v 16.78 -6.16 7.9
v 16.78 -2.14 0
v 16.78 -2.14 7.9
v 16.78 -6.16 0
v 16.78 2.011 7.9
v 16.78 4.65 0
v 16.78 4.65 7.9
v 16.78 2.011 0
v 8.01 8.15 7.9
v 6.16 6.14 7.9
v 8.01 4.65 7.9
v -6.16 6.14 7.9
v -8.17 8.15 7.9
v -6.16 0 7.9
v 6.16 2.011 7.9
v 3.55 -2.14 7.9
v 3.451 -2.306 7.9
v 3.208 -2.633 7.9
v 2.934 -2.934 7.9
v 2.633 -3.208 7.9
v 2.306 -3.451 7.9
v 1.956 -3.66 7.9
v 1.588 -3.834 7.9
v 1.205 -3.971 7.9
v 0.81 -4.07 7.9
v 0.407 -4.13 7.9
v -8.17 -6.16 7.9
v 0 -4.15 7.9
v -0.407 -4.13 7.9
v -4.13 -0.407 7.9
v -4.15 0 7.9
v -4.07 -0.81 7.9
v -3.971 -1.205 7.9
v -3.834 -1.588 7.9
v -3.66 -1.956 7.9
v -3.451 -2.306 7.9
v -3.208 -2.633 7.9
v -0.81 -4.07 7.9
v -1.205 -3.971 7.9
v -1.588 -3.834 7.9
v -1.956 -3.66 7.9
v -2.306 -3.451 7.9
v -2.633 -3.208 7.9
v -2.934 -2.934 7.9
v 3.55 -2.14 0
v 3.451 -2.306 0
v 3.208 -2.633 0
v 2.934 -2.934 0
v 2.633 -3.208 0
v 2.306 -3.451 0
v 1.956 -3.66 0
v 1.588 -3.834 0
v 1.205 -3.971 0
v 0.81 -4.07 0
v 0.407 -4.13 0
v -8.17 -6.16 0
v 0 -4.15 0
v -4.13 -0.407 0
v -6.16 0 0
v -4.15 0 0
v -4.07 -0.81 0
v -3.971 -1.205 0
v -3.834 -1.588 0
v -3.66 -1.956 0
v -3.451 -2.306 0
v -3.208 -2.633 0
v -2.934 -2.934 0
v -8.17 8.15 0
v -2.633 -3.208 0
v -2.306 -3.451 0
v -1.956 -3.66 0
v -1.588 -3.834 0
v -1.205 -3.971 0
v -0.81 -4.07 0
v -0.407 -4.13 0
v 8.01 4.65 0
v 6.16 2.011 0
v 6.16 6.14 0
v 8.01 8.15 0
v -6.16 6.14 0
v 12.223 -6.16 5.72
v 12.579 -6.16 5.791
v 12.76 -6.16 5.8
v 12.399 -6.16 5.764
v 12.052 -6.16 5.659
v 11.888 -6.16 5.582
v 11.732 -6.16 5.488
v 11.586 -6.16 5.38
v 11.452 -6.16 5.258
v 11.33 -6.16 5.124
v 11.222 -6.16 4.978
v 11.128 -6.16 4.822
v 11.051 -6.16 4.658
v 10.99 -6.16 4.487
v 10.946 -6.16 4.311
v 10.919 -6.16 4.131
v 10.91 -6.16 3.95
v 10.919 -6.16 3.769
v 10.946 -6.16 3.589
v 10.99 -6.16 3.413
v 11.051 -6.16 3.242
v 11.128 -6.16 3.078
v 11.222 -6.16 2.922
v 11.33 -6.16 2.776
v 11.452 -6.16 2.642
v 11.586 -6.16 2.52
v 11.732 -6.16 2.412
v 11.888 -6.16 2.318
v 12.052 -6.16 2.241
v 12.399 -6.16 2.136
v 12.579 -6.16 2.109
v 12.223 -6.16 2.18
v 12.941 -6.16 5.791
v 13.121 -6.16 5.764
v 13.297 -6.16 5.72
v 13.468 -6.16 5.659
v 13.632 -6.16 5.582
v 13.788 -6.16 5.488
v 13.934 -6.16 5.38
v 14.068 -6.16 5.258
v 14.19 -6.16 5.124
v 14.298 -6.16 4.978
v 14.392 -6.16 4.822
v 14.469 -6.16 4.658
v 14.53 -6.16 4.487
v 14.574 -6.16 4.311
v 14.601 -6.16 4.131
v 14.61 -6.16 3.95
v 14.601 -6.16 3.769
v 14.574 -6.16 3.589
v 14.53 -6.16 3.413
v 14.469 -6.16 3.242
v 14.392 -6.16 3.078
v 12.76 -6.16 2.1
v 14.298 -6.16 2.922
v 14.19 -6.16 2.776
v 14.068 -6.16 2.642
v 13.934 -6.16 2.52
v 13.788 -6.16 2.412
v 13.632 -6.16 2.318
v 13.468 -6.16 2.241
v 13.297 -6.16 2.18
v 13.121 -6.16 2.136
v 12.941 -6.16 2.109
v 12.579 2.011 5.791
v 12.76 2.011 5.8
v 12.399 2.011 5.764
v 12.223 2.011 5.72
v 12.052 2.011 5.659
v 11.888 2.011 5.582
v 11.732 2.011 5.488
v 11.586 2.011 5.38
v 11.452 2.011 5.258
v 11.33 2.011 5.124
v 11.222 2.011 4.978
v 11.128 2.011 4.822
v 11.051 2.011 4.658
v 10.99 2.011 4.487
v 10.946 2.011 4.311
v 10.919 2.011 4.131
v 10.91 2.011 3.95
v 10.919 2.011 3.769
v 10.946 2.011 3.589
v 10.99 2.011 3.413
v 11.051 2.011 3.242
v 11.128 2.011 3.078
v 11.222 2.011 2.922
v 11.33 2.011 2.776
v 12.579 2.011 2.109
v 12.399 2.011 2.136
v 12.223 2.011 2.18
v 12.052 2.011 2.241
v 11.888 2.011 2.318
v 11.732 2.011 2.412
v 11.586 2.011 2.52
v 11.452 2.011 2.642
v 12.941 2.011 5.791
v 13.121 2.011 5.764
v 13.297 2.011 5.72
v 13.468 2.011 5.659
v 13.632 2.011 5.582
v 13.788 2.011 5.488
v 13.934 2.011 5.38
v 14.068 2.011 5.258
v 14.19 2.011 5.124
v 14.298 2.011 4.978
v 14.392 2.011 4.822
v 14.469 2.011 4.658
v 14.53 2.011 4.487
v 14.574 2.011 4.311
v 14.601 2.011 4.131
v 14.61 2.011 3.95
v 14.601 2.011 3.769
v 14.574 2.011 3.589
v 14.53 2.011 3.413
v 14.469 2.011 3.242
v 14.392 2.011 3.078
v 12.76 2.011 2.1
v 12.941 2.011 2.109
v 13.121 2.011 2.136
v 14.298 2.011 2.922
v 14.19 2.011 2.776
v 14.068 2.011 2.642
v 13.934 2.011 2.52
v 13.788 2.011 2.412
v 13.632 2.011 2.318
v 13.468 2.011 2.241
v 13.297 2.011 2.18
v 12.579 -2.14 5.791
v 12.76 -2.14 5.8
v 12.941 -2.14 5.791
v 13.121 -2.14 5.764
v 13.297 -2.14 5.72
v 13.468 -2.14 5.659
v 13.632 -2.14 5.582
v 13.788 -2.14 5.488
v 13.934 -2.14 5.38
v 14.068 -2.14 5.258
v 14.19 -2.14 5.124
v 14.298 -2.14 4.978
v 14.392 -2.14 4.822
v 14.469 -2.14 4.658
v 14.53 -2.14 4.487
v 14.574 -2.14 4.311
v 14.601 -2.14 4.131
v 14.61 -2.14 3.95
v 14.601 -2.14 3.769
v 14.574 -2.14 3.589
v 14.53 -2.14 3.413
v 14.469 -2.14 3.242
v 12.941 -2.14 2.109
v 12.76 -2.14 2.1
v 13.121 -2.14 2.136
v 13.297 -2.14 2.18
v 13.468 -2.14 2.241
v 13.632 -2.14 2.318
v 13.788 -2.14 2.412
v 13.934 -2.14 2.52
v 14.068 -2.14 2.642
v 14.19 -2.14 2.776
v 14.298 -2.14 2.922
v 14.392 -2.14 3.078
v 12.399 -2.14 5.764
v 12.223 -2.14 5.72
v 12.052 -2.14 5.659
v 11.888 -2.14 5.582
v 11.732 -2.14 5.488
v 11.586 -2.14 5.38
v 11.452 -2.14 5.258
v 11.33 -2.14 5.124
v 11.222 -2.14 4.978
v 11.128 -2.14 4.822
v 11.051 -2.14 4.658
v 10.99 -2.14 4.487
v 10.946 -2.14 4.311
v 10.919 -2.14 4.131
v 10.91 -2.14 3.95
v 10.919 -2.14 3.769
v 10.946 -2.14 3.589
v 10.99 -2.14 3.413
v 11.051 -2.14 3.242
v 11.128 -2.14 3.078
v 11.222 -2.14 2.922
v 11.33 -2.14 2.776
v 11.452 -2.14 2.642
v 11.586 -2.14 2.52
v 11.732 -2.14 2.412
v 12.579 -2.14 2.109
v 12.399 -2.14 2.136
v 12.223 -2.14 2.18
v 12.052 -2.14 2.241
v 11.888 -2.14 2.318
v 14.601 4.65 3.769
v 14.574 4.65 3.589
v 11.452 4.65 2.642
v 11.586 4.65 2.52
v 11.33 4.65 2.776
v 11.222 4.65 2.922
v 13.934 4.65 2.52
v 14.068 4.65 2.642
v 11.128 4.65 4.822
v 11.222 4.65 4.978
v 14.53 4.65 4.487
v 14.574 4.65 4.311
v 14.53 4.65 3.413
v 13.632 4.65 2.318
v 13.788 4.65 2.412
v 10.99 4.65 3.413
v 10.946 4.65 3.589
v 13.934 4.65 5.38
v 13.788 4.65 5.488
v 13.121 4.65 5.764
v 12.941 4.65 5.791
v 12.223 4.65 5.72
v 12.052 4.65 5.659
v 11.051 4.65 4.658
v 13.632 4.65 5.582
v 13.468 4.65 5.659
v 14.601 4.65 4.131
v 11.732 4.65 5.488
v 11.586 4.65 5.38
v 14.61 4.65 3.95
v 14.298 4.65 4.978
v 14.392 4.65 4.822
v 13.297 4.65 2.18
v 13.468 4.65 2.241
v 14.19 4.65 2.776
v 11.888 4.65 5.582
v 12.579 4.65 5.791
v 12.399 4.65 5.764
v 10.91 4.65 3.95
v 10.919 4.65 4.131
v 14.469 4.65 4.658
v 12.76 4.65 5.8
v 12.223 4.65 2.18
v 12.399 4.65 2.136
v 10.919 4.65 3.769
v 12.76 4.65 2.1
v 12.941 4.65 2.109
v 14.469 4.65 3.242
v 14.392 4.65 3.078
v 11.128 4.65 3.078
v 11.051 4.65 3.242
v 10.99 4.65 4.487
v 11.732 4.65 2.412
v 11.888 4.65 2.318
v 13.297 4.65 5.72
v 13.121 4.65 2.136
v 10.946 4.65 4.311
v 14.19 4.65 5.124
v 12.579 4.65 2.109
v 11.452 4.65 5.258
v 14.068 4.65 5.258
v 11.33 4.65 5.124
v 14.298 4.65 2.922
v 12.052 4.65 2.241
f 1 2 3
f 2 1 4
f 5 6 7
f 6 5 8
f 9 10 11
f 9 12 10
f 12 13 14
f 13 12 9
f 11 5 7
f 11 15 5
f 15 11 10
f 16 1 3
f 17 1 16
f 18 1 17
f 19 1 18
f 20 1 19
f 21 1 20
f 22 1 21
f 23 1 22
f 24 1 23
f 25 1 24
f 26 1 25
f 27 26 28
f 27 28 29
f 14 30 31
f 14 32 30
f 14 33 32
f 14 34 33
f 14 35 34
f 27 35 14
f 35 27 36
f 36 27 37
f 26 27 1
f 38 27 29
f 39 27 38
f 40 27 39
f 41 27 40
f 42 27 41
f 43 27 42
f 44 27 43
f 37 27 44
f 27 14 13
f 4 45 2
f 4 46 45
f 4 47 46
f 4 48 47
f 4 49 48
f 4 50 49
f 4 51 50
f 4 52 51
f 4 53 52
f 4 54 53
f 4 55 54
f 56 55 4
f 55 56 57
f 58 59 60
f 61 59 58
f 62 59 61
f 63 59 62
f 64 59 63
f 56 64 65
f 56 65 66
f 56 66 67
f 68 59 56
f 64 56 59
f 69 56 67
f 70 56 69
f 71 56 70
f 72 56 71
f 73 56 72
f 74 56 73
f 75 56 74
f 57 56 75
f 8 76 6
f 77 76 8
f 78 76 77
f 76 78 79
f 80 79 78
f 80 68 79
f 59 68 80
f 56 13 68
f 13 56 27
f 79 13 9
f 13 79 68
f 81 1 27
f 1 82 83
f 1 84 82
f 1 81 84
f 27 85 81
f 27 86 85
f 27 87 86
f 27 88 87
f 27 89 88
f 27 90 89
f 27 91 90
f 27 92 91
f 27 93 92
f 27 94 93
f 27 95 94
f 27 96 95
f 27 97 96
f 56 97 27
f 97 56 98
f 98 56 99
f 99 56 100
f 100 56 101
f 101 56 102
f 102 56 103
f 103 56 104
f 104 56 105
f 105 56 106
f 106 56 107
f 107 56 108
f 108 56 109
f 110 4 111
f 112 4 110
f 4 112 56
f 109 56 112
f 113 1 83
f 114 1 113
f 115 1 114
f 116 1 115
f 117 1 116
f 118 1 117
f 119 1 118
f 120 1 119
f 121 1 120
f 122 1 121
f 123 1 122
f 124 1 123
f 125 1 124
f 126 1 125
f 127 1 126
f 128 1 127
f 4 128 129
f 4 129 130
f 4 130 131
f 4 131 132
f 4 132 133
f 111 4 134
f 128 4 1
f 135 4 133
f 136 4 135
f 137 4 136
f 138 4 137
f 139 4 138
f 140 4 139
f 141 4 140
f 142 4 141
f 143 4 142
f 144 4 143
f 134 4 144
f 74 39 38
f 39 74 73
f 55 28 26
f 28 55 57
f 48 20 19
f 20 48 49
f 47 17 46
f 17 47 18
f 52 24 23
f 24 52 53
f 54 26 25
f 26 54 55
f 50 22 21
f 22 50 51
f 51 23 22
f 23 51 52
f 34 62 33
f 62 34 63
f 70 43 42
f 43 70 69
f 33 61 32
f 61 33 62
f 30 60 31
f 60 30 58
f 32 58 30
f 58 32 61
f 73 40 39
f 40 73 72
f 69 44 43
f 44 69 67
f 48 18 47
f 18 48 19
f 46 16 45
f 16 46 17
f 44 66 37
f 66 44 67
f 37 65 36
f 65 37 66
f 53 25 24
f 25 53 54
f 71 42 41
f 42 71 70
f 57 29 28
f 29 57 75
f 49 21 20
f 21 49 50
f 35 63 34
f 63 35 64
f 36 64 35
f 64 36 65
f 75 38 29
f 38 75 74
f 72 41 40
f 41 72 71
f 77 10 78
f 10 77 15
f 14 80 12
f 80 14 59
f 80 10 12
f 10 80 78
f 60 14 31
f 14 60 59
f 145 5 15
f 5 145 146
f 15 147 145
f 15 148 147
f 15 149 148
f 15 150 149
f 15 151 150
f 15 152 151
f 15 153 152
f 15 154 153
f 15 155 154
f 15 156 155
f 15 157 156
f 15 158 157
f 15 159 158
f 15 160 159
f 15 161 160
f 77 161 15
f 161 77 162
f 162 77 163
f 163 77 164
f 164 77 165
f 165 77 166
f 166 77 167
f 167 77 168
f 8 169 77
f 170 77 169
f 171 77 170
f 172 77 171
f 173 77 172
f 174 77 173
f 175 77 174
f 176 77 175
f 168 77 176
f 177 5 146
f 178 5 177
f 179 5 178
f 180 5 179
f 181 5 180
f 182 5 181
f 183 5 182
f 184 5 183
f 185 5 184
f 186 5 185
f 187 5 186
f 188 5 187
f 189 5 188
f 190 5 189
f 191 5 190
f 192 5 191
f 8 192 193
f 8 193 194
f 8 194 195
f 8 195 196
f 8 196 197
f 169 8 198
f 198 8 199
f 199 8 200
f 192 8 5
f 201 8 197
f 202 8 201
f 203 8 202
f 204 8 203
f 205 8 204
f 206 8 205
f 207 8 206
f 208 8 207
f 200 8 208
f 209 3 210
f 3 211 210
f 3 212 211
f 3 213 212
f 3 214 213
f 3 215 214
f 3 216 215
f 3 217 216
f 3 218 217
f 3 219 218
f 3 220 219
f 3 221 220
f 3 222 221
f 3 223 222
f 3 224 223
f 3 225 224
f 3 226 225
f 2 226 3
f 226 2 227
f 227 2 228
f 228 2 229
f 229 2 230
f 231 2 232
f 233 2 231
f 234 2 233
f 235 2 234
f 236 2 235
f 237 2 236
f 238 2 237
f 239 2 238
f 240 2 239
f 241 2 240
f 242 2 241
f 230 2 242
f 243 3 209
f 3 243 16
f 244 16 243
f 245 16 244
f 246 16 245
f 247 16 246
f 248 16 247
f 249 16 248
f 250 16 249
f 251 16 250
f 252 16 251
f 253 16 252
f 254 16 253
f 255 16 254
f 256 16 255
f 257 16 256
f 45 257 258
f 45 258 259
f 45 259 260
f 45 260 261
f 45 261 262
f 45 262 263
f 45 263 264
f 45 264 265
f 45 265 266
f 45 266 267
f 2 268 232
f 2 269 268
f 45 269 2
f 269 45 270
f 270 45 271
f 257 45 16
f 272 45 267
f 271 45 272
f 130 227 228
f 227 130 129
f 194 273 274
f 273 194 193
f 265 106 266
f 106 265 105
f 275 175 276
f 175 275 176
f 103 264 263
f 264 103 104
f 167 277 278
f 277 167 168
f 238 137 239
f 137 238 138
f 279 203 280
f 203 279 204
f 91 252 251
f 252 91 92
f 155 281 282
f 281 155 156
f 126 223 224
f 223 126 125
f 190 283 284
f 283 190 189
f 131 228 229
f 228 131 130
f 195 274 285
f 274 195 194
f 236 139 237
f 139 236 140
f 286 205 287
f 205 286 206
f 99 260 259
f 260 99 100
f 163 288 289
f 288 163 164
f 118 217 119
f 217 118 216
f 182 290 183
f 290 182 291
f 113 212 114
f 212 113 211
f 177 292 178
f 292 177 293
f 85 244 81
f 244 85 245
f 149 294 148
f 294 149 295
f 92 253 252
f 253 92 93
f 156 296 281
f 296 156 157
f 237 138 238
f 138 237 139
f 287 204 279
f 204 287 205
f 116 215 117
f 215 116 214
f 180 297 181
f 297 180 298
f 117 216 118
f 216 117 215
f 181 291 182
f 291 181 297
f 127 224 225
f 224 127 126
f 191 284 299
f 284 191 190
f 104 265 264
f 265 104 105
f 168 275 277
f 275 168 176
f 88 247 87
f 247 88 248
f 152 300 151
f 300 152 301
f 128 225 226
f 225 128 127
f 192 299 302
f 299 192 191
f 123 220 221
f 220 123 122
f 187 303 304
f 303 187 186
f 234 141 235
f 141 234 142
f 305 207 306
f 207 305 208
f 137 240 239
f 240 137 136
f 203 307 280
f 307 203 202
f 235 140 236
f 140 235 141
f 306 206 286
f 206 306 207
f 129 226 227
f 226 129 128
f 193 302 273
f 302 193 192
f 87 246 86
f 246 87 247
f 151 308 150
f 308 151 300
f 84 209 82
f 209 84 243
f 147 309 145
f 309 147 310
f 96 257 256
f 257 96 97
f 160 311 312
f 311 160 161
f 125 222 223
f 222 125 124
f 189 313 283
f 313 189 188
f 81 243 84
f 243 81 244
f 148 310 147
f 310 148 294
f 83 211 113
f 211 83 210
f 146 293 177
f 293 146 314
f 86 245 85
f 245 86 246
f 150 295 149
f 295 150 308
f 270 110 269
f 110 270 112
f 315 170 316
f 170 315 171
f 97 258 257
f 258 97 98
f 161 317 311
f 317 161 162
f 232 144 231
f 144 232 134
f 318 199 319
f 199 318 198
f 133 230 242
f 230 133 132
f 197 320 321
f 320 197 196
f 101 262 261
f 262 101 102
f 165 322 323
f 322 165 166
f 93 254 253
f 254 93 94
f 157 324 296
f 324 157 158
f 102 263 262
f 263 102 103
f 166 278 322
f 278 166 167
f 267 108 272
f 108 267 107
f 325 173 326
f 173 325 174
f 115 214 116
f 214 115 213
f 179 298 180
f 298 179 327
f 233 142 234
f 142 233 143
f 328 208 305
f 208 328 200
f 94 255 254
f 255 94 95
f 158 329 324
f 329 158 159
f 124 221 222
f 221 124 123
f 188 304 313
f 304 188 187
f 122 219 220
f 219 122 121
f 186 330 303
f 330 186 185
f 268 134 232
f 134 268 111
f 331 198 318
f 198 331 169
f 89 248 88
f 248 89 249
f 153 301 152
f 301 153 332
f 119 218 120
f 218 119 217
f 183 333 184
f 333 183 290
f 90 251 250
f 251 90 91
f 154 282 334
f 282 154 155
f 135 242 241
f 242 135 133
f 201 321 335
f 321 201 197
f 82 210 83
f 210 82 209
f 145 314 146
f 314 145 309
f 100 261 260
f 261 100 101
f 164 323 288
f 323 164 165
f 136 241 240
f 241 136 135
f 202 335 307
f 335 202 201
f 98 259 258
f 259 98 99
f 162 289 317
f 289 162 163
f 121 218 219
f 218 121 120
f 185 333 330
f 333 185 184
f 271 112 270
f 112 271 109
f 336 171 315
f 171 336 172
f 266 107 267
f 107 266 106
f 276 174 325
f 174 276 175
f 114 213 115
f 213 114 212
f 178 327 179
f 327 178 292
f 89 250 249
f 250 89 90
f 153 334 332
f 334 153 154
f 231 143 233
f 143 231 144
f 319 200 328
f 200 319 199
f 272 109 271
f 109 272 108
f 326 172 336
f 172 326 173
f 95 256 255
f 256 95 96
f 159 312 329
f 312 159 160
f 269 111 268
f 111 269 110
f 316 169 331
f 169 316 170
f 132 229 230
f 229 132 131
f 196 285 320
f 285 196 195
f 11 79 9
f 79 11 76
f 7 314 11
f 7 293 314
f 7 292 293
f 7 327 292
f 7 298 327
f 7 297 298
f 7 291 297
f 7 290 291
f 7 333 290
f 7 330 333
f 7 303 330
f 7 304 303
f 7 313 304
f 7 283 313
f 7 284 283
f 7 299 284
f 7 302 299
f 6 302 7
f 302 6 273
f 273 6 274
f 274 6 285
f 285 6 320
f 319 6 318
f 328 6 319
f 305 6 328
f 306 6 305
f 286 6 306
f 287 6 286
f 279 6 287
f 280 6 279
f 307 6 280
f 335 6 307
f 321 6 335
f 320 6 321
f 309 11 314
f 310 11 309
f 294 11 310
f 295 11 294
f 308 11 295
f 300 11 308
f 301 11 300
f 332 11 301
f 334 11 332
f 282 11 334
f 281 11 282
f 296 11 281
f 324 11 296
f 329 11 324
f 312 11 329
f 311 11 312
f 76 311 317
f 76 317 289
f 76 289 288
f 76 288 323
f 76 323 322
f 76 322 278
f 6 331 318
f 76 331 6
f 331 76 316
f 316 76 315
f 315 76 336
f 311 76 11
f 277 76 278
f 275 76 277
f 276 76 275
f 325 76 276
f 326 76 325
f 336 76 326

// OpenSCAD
// file: linear_bushing_housing.scad
/*
 * Igor Soares' parallel kinematic XY
 * Linear bushing housing
 * (C) 2014 by Ígor Bruno Pereira Soares
 *
 * This project is free: you can redistribute it and/or modify
 * it under the terms of the GNU General Public License as published by
 * the Free Software Foundation, either version 2 of the License, or
 * (at your option) any later version.
 *
 * This project is distributed in the hope that it will be useful,
 * but WITHOUT ANY WARRANTY; without even the implied warranty of
 * MERCHANTABILITY or FITNESS FOR A PARTICULAR PURPOSE.  See the
 * GNU General Public License for more details.
 *
 * You should have received a copy of the GNU General Public License
 * along with this project.  If not, see <http://www.gnu.org/licenses/>.
 */

include <configuration.scad>

linear_bushing_housing($fn=64);

module linear_bushing_housing_positive(
    wall=WALL_WIDTH,
    lwall=LIGHT_WALL_WIDTH,
    hsupp=HORIZONTAL_SUPPORT_WALL,
    vsupp=VERTICAL_SUPPORT_WALL,
    screw_r=3.7/2,
    screw_nut_width=6.7,
    bushing_r=LINEAR_BUSHING_DIAMETER/2,
    bushing_l=LINEAR_BUSHING_LEN,
    bushing_wall=LINEAR_BUSHING_WALL,
    num_screws=1)
{
  union() {
    //bushing
    cylinder(r=bushing_r + lwall, h=bushing_l + 2*bushing_wall);
    translate([0, -bushing_r - lwall, 0])
      cube([(bushing_r + screw_r),
            2*(bushing_r + lwall),
            bushing_l + 2*bushing_wall]);
    //bushing screws
    if(num_screws >= 1)
      translate([(bushing_r + screw_r),
                 0,
                 (lwall+screw_r)/cos(45)])
        rotate([0,45,0])
          cube([2*(screw_r + lwall), 2*(bushing_r + lwall), 2*(screw_r + lwall)],
               center=true);
    if(num_screws >= 2)
      translate([(bushing_r + screw_r),
                 0,
                 bushing_l + 2*bushing_wall - (lwall+screw_r)/cos(45)])
        rotate([0,45,0])
          cube([2*(screw_r + lwall), 2*(bushing_r + lwall), 2*(screw_r + lwall)],
               center=true);
  }
}

module linear_bushing_housing_negative(
    wall=WALL_WIDTH,
    lwall=LIGHT_WALL_WIDTH,
    hsupp=HORIZONTAL_SUPPORT_WALL,
    vsupp=VERTICAL_SUPPORT_WALL,
    screw_r=3.7/2,
    screw_nut_width=6.7,
    bushing_r=LINEAR_BUSHING_DIAMETER/2,
    bushing_l=LINEAR_BUSHING_LEN,
    bushing_wall=LINEAR_BUSHING_WALL,
    num_screws=1)
{
  union() {
    //bushing
    translate([0,0,-ST])
      cylinder(r=bushing_r - bushing_wall, h=bushing_l + bushing_wall);
    translate([0,0,bushing_l + bushing_wall + hsupp])
      cylinder(r=bushing_r - bushing_wall, h=bushing_wall + ST);
    translate([0,0,bushing_wall])
      cylinder(r=bushing_r, h=bushing_l);

    //bushing access
    translate([0, -bushing_r + bushing_wall, 0])
      union()
    {
      translate([0,0,-ST])
        cube([(bushing_r + lwall) + (2*screw_r + wall)/cos(45) +1,
               2*(bushing_r -bushing_wall),
               bushing_l + bushing_wall]);
      translate([0, 0, bushing_l + bushing_wall + hsupp])
        cube([(bushing_r + lwall) + (2*screw_r + wall)/cos(45) +1,
               2*(bushing_r -bushing_wall),
               bushing_wall +ST]);
    }
    //bushing screws
    if(num_screws >= 1)
      translate([(bushing_r + screw_r),
                 0,
                 (lwall+screw_r)/cos(45)])
        rotate([90,0,0])
          cylinder(r=screw_r, h=2*bushing_r + 2*lwall +2, center=true);

    if(num_screws >= 2)
      translate([(bushing_r + screw_r),
                 0,
                 bushing_l + 2*bushing_wall - (lwall+screw_r)/cos(45)])
        rotate([90,0,0])
          cylinder(r=screw_r, h=2*bushing_r + 2*lwall +2, center=true);
  }
}

module linear_bushing_housing(
    wall=WALL_WIDTH,
    lwall=LIGHT_WALL_WIDTH,
    hsupp=HORIZONTAL_SUPPORT_WALL,
    vsupp=VERTICAL_SUPPORT_WALL,
    screw_r=3.7/2,
    screw_nut_width=6.7,
    bushing_r=LINEAR_BUSHING_DIAMETER/2,
    bushing_l=LINEAR_BUSHING_LEN,
    bushing_wall=LINEAR_BUSHING_WALL,
    num_screws=1)
{
  difference() {
    linear_bushing_housing_positive(
      wall=wall,
      lwall=lwall,
      hsupp=hsupp,
      vsupp=vsupp,
      screw_r=screw_r,
      screw_nut_width=screw_nut_width,
      bushing_r=bushing_r,
      bushing_l=bushing_l,
      bushing_wall=bushing_wall,
      num_screws=num_screws);
    linear_bushing_housing_negative(
      wall=wall,
      lwall=lwall,
      hsupp=hsupp,
      vsupp=vsupp,
      screw_r=screw_r,
      screw_nut_width=screw_nut_width,
      bushing_r=bushing_r,
      bushing_l=bushing_l,
      bushing_wall=bushing_wall,
      num_screws=num_screws);
  }
}
// file: configuration.scad
/*
 * Igor Soares' parallel kinematic XY
 * Configuration
 * (C) 2014 by Ígor Bruno Pereira Soares
 *
 * This project is free: you can redistribute it and/or modify
 * it under the terms of the GNU General Public License as published by
 * the Free Software Foundation, either version 2 of the License, or
 * (at your option) any later version.
 *
 * This project is distributed in the hope that it will be useful,
 * but WITHOUT ANY WARRANTY; without even the implied warranty of
 * MERCHANTABILITY or FITNESS FOR A PARTICULAR PURPOSE.  See the
 * GNU General Public License for more details.
 *
 * You should have received a copy of the GNU General Public License
 * along with this project.  If not, see <http://www.gnu.org/licenses/>.
 */

LIGHT_WALL_WIDTH = 2.01;
WALL_WIDTH = 5.0;
VERTICAL_SUPPORT_WALL = 0.5;
HORIZONTAL_SUPPORT_WALL = 0.255;

BEARING_DIAMETER = 22.4;
BEARING_WIDTH = 7;
BEARING_SCREW_DIAMETER = 8.2;
BEARING_SCREW_NUT_WIDTH = 13;

LINEAR_BUSHING_DIAMETER = 15.3;
LINEAR_BUSHING_LEN = 24.4;
LINEAR_BUSHING_WALL = 1.0;

INNER_BEARING_SCREW_DISTANCE_TO_ROD = VERTICAL_SUPPORT_WALL;
INNER_BEARING_POS = 15;

SPACING_TO_BEARING = 18.0;
ROD_ACTUAL_DIAMETER = 8.0;
ROD_HOLE_DIAMETER = 8.4;

ROD_CLAMP_SCREW_DIAMETER = 4.8+ 0.3;
ROD_CLAMP_SCREW_NUT_WIDTH = 6.7;
ROD_CLAMP_SCREW_NUT_H = 3.5;
ROD_CLAMP_GAP = 1.0;

FRAME_ROD_DIAMETER = 8.4;
FRAME_VERTICE_WALL_WIDTH = 3.5;

WIRE_END_SCREW_DIAMETER = 4.8 + 0.3; // 3/16 + tolerance

MOTOR_SCREW_DIAMETER = 3.4;
MOTOR_SCREW_MOUNT = 31; // nema 17
MOTOR_SIZE = 43;
MOTOR_MOUNT_INNER_DIAMETER = 30;
MOTOR_BELT_CLEARANCE = 5;

MOTOR_SUPPORT_SCREW_DIAMETER = 4.8 + 0.3; // 3/16 + tolerance
MOTOR_SUPPORT_SCREWS_DISTANCE = 40;

BEARING_GUIDE_H = 7;
BEARING_GUIDE_ANGLE = 30;

ST = 0.001;
// main file
/*
 * Igor Soares' parallel kinematic XY
 * Linear bushing housing
 * (C) 2014 by Ígor Bruno Pereira Soares
 *
 * This project is free: you can redistribute it and/or modify
 * it under the terms of the GNU General Public License as published by
 * the Free Software Foundation, either version 2 of the License, or
 * (at your option) any later version.
 *
 * This project is distributed in the hope that it will be useful,
 * but WITHOUT ANY WARRANTY; without even the implied warranty of
 * MERCHANTABILITY or FITNESS FOR A PARTICULAR PURPOSE.  See the
 * GNU General Public License for more details.
 *
 * You should have received a copy of the GNU General Public License
 * along with this project.  If not, see <http://www.gnu.org/licenses/>.
 */

include <configuration.scad>
use <linear_bushing_housing.scad>

flex_clamp($fn=64);
//xy_linear_bushing_housing($fn=64);

module xy_linear_bushing_housing(
    wall=WALL_WIDTH,
    lwall=LIGHT_WALL_WIDTH,
    extra_gap=1,
    hsupp=-0.01,
    vsupp=VERTICAL_SUPPORT_WALL,
    screw_r=3.7/2,
    screw_nut_width=6.7,
    bushing_r=10.4/2,
    bushing_l=8.3,
    bushing_wall=0.5,
    total_len=125,
    bed_screw_r=3.7/2,
    bed_screws_room=6,
    bed_screws_separation=40,
    vertical_screws_separation=85,
    vertical_screw_r=5.2/2,
    vertical_screw_head_r=13/2,
    support_h=30)
{

  difference() {
    union() {
      translate([0, - lwall - bushing_r, 0])
        cube([total_len, 2*(lwall + bushing_r), bushing_r + wall - lwall]);
      for(i=[-1,1])
        translate([total_len/2 - i*vertical_screws_separation/2, 0, 0])
          difference()
      {
        union() {
          translate([-wall-vertical_screw_r, 0, 0])
            cube([2*(wall + vertical_screw_r), bushing_r + lwall + vertical_screw_head_r, wall]);
          translate([0, bushing_r + lwall + vertical_screw_head_r - ST, 0])
            cylinder(r=wall + vertical_screw_r, h=wall);
        }
        translate([0, bushing_r + lwall + vertical_screw_head_r - ST, -1])
          #cylinder(r= vertical_screw_r, h=wall+2);
      }
    }
    translate([-1, 0, wall + bushing_r]) rotate([0,90,0])
      #cylinder(r=bushing_r - bushing_wall, h=total_len +2);
    translate([lwall, 0, wall + bushing_r]) rotate([0,90,0])
      #cylinder(r=bushing_r, h=bushing_l);
    translate([lwall, -lwall - bushing_r -1, -1])
      #cube([bushing_l, 2*(lwall + bushing_r) +2, lwall + extra_gap + 1]);
    translate([total_len - lwall, 0, wall + bushing_r]) rotate([0,-90,0])
      #cylinder(r=bushing_r, h=bushing_l);
    translate([total_len - bushing_l -lwall, -lwall - bushing_r -1, -1])
      #cube([bushing_l, 2*(lwall + bushing_r) +2, lwall + extra_gap + 1]);
  }
}

module flex_clamp(
  wall=WALL_WIDTH,
  lwall=LIGHT_WALL_WIDTH,
  extra_gap=1,
  bushing_r=8.3/2,
  bushing_l=7.9,
  screw_r=3.7/2,
  screw_head_r=9.5/2)
{
  difference() {
    union() {
      translate([-bushing_r - 2*lwall, -bushing_r -lwall, 0])
        cube([2*(bushing_r + 2*lwall) + screw_head_r + screw_r + lwall,
              2*bushing_r + lwall + wall -extra_gap,
              bushing_l]);
    }
    translate([0,0,-1])
      #cylinder(r=bushing_r, h=bushing_l+2);
    translate([-bushing_r - lwall, 0, -1])
      #cube([2*(bushing_r + lwall),
             bushing_r - lwall + wall -extra_gap,
             bushing_l +2]);
    translate([0, -bushing_r + lwall, -1])
      #cube([2*(bushing_r + 2*lwall) + screw_head_r + screw_r + lwall,
             bushing_r + ST,
             bushing_l +2]);
    translate([bushing_r + lwall + screw_head_r + screw_r,
               bushing_r + wall +1,
               bushing_l/2]) rotate([90,0,0])
      #cylinder(r=screw_r, h=2*bushing_r + 2*lwall + wall);
    translate([bushing_r + lwall + screw_head_r + screw_r,
               bushing_r + wall/2 +1,
               bushing_l/2]) rotate([90,0,0])
      #cube([2*screw_head_r, 2*screw_head_r, 1+wall], center=true);
  }
}
